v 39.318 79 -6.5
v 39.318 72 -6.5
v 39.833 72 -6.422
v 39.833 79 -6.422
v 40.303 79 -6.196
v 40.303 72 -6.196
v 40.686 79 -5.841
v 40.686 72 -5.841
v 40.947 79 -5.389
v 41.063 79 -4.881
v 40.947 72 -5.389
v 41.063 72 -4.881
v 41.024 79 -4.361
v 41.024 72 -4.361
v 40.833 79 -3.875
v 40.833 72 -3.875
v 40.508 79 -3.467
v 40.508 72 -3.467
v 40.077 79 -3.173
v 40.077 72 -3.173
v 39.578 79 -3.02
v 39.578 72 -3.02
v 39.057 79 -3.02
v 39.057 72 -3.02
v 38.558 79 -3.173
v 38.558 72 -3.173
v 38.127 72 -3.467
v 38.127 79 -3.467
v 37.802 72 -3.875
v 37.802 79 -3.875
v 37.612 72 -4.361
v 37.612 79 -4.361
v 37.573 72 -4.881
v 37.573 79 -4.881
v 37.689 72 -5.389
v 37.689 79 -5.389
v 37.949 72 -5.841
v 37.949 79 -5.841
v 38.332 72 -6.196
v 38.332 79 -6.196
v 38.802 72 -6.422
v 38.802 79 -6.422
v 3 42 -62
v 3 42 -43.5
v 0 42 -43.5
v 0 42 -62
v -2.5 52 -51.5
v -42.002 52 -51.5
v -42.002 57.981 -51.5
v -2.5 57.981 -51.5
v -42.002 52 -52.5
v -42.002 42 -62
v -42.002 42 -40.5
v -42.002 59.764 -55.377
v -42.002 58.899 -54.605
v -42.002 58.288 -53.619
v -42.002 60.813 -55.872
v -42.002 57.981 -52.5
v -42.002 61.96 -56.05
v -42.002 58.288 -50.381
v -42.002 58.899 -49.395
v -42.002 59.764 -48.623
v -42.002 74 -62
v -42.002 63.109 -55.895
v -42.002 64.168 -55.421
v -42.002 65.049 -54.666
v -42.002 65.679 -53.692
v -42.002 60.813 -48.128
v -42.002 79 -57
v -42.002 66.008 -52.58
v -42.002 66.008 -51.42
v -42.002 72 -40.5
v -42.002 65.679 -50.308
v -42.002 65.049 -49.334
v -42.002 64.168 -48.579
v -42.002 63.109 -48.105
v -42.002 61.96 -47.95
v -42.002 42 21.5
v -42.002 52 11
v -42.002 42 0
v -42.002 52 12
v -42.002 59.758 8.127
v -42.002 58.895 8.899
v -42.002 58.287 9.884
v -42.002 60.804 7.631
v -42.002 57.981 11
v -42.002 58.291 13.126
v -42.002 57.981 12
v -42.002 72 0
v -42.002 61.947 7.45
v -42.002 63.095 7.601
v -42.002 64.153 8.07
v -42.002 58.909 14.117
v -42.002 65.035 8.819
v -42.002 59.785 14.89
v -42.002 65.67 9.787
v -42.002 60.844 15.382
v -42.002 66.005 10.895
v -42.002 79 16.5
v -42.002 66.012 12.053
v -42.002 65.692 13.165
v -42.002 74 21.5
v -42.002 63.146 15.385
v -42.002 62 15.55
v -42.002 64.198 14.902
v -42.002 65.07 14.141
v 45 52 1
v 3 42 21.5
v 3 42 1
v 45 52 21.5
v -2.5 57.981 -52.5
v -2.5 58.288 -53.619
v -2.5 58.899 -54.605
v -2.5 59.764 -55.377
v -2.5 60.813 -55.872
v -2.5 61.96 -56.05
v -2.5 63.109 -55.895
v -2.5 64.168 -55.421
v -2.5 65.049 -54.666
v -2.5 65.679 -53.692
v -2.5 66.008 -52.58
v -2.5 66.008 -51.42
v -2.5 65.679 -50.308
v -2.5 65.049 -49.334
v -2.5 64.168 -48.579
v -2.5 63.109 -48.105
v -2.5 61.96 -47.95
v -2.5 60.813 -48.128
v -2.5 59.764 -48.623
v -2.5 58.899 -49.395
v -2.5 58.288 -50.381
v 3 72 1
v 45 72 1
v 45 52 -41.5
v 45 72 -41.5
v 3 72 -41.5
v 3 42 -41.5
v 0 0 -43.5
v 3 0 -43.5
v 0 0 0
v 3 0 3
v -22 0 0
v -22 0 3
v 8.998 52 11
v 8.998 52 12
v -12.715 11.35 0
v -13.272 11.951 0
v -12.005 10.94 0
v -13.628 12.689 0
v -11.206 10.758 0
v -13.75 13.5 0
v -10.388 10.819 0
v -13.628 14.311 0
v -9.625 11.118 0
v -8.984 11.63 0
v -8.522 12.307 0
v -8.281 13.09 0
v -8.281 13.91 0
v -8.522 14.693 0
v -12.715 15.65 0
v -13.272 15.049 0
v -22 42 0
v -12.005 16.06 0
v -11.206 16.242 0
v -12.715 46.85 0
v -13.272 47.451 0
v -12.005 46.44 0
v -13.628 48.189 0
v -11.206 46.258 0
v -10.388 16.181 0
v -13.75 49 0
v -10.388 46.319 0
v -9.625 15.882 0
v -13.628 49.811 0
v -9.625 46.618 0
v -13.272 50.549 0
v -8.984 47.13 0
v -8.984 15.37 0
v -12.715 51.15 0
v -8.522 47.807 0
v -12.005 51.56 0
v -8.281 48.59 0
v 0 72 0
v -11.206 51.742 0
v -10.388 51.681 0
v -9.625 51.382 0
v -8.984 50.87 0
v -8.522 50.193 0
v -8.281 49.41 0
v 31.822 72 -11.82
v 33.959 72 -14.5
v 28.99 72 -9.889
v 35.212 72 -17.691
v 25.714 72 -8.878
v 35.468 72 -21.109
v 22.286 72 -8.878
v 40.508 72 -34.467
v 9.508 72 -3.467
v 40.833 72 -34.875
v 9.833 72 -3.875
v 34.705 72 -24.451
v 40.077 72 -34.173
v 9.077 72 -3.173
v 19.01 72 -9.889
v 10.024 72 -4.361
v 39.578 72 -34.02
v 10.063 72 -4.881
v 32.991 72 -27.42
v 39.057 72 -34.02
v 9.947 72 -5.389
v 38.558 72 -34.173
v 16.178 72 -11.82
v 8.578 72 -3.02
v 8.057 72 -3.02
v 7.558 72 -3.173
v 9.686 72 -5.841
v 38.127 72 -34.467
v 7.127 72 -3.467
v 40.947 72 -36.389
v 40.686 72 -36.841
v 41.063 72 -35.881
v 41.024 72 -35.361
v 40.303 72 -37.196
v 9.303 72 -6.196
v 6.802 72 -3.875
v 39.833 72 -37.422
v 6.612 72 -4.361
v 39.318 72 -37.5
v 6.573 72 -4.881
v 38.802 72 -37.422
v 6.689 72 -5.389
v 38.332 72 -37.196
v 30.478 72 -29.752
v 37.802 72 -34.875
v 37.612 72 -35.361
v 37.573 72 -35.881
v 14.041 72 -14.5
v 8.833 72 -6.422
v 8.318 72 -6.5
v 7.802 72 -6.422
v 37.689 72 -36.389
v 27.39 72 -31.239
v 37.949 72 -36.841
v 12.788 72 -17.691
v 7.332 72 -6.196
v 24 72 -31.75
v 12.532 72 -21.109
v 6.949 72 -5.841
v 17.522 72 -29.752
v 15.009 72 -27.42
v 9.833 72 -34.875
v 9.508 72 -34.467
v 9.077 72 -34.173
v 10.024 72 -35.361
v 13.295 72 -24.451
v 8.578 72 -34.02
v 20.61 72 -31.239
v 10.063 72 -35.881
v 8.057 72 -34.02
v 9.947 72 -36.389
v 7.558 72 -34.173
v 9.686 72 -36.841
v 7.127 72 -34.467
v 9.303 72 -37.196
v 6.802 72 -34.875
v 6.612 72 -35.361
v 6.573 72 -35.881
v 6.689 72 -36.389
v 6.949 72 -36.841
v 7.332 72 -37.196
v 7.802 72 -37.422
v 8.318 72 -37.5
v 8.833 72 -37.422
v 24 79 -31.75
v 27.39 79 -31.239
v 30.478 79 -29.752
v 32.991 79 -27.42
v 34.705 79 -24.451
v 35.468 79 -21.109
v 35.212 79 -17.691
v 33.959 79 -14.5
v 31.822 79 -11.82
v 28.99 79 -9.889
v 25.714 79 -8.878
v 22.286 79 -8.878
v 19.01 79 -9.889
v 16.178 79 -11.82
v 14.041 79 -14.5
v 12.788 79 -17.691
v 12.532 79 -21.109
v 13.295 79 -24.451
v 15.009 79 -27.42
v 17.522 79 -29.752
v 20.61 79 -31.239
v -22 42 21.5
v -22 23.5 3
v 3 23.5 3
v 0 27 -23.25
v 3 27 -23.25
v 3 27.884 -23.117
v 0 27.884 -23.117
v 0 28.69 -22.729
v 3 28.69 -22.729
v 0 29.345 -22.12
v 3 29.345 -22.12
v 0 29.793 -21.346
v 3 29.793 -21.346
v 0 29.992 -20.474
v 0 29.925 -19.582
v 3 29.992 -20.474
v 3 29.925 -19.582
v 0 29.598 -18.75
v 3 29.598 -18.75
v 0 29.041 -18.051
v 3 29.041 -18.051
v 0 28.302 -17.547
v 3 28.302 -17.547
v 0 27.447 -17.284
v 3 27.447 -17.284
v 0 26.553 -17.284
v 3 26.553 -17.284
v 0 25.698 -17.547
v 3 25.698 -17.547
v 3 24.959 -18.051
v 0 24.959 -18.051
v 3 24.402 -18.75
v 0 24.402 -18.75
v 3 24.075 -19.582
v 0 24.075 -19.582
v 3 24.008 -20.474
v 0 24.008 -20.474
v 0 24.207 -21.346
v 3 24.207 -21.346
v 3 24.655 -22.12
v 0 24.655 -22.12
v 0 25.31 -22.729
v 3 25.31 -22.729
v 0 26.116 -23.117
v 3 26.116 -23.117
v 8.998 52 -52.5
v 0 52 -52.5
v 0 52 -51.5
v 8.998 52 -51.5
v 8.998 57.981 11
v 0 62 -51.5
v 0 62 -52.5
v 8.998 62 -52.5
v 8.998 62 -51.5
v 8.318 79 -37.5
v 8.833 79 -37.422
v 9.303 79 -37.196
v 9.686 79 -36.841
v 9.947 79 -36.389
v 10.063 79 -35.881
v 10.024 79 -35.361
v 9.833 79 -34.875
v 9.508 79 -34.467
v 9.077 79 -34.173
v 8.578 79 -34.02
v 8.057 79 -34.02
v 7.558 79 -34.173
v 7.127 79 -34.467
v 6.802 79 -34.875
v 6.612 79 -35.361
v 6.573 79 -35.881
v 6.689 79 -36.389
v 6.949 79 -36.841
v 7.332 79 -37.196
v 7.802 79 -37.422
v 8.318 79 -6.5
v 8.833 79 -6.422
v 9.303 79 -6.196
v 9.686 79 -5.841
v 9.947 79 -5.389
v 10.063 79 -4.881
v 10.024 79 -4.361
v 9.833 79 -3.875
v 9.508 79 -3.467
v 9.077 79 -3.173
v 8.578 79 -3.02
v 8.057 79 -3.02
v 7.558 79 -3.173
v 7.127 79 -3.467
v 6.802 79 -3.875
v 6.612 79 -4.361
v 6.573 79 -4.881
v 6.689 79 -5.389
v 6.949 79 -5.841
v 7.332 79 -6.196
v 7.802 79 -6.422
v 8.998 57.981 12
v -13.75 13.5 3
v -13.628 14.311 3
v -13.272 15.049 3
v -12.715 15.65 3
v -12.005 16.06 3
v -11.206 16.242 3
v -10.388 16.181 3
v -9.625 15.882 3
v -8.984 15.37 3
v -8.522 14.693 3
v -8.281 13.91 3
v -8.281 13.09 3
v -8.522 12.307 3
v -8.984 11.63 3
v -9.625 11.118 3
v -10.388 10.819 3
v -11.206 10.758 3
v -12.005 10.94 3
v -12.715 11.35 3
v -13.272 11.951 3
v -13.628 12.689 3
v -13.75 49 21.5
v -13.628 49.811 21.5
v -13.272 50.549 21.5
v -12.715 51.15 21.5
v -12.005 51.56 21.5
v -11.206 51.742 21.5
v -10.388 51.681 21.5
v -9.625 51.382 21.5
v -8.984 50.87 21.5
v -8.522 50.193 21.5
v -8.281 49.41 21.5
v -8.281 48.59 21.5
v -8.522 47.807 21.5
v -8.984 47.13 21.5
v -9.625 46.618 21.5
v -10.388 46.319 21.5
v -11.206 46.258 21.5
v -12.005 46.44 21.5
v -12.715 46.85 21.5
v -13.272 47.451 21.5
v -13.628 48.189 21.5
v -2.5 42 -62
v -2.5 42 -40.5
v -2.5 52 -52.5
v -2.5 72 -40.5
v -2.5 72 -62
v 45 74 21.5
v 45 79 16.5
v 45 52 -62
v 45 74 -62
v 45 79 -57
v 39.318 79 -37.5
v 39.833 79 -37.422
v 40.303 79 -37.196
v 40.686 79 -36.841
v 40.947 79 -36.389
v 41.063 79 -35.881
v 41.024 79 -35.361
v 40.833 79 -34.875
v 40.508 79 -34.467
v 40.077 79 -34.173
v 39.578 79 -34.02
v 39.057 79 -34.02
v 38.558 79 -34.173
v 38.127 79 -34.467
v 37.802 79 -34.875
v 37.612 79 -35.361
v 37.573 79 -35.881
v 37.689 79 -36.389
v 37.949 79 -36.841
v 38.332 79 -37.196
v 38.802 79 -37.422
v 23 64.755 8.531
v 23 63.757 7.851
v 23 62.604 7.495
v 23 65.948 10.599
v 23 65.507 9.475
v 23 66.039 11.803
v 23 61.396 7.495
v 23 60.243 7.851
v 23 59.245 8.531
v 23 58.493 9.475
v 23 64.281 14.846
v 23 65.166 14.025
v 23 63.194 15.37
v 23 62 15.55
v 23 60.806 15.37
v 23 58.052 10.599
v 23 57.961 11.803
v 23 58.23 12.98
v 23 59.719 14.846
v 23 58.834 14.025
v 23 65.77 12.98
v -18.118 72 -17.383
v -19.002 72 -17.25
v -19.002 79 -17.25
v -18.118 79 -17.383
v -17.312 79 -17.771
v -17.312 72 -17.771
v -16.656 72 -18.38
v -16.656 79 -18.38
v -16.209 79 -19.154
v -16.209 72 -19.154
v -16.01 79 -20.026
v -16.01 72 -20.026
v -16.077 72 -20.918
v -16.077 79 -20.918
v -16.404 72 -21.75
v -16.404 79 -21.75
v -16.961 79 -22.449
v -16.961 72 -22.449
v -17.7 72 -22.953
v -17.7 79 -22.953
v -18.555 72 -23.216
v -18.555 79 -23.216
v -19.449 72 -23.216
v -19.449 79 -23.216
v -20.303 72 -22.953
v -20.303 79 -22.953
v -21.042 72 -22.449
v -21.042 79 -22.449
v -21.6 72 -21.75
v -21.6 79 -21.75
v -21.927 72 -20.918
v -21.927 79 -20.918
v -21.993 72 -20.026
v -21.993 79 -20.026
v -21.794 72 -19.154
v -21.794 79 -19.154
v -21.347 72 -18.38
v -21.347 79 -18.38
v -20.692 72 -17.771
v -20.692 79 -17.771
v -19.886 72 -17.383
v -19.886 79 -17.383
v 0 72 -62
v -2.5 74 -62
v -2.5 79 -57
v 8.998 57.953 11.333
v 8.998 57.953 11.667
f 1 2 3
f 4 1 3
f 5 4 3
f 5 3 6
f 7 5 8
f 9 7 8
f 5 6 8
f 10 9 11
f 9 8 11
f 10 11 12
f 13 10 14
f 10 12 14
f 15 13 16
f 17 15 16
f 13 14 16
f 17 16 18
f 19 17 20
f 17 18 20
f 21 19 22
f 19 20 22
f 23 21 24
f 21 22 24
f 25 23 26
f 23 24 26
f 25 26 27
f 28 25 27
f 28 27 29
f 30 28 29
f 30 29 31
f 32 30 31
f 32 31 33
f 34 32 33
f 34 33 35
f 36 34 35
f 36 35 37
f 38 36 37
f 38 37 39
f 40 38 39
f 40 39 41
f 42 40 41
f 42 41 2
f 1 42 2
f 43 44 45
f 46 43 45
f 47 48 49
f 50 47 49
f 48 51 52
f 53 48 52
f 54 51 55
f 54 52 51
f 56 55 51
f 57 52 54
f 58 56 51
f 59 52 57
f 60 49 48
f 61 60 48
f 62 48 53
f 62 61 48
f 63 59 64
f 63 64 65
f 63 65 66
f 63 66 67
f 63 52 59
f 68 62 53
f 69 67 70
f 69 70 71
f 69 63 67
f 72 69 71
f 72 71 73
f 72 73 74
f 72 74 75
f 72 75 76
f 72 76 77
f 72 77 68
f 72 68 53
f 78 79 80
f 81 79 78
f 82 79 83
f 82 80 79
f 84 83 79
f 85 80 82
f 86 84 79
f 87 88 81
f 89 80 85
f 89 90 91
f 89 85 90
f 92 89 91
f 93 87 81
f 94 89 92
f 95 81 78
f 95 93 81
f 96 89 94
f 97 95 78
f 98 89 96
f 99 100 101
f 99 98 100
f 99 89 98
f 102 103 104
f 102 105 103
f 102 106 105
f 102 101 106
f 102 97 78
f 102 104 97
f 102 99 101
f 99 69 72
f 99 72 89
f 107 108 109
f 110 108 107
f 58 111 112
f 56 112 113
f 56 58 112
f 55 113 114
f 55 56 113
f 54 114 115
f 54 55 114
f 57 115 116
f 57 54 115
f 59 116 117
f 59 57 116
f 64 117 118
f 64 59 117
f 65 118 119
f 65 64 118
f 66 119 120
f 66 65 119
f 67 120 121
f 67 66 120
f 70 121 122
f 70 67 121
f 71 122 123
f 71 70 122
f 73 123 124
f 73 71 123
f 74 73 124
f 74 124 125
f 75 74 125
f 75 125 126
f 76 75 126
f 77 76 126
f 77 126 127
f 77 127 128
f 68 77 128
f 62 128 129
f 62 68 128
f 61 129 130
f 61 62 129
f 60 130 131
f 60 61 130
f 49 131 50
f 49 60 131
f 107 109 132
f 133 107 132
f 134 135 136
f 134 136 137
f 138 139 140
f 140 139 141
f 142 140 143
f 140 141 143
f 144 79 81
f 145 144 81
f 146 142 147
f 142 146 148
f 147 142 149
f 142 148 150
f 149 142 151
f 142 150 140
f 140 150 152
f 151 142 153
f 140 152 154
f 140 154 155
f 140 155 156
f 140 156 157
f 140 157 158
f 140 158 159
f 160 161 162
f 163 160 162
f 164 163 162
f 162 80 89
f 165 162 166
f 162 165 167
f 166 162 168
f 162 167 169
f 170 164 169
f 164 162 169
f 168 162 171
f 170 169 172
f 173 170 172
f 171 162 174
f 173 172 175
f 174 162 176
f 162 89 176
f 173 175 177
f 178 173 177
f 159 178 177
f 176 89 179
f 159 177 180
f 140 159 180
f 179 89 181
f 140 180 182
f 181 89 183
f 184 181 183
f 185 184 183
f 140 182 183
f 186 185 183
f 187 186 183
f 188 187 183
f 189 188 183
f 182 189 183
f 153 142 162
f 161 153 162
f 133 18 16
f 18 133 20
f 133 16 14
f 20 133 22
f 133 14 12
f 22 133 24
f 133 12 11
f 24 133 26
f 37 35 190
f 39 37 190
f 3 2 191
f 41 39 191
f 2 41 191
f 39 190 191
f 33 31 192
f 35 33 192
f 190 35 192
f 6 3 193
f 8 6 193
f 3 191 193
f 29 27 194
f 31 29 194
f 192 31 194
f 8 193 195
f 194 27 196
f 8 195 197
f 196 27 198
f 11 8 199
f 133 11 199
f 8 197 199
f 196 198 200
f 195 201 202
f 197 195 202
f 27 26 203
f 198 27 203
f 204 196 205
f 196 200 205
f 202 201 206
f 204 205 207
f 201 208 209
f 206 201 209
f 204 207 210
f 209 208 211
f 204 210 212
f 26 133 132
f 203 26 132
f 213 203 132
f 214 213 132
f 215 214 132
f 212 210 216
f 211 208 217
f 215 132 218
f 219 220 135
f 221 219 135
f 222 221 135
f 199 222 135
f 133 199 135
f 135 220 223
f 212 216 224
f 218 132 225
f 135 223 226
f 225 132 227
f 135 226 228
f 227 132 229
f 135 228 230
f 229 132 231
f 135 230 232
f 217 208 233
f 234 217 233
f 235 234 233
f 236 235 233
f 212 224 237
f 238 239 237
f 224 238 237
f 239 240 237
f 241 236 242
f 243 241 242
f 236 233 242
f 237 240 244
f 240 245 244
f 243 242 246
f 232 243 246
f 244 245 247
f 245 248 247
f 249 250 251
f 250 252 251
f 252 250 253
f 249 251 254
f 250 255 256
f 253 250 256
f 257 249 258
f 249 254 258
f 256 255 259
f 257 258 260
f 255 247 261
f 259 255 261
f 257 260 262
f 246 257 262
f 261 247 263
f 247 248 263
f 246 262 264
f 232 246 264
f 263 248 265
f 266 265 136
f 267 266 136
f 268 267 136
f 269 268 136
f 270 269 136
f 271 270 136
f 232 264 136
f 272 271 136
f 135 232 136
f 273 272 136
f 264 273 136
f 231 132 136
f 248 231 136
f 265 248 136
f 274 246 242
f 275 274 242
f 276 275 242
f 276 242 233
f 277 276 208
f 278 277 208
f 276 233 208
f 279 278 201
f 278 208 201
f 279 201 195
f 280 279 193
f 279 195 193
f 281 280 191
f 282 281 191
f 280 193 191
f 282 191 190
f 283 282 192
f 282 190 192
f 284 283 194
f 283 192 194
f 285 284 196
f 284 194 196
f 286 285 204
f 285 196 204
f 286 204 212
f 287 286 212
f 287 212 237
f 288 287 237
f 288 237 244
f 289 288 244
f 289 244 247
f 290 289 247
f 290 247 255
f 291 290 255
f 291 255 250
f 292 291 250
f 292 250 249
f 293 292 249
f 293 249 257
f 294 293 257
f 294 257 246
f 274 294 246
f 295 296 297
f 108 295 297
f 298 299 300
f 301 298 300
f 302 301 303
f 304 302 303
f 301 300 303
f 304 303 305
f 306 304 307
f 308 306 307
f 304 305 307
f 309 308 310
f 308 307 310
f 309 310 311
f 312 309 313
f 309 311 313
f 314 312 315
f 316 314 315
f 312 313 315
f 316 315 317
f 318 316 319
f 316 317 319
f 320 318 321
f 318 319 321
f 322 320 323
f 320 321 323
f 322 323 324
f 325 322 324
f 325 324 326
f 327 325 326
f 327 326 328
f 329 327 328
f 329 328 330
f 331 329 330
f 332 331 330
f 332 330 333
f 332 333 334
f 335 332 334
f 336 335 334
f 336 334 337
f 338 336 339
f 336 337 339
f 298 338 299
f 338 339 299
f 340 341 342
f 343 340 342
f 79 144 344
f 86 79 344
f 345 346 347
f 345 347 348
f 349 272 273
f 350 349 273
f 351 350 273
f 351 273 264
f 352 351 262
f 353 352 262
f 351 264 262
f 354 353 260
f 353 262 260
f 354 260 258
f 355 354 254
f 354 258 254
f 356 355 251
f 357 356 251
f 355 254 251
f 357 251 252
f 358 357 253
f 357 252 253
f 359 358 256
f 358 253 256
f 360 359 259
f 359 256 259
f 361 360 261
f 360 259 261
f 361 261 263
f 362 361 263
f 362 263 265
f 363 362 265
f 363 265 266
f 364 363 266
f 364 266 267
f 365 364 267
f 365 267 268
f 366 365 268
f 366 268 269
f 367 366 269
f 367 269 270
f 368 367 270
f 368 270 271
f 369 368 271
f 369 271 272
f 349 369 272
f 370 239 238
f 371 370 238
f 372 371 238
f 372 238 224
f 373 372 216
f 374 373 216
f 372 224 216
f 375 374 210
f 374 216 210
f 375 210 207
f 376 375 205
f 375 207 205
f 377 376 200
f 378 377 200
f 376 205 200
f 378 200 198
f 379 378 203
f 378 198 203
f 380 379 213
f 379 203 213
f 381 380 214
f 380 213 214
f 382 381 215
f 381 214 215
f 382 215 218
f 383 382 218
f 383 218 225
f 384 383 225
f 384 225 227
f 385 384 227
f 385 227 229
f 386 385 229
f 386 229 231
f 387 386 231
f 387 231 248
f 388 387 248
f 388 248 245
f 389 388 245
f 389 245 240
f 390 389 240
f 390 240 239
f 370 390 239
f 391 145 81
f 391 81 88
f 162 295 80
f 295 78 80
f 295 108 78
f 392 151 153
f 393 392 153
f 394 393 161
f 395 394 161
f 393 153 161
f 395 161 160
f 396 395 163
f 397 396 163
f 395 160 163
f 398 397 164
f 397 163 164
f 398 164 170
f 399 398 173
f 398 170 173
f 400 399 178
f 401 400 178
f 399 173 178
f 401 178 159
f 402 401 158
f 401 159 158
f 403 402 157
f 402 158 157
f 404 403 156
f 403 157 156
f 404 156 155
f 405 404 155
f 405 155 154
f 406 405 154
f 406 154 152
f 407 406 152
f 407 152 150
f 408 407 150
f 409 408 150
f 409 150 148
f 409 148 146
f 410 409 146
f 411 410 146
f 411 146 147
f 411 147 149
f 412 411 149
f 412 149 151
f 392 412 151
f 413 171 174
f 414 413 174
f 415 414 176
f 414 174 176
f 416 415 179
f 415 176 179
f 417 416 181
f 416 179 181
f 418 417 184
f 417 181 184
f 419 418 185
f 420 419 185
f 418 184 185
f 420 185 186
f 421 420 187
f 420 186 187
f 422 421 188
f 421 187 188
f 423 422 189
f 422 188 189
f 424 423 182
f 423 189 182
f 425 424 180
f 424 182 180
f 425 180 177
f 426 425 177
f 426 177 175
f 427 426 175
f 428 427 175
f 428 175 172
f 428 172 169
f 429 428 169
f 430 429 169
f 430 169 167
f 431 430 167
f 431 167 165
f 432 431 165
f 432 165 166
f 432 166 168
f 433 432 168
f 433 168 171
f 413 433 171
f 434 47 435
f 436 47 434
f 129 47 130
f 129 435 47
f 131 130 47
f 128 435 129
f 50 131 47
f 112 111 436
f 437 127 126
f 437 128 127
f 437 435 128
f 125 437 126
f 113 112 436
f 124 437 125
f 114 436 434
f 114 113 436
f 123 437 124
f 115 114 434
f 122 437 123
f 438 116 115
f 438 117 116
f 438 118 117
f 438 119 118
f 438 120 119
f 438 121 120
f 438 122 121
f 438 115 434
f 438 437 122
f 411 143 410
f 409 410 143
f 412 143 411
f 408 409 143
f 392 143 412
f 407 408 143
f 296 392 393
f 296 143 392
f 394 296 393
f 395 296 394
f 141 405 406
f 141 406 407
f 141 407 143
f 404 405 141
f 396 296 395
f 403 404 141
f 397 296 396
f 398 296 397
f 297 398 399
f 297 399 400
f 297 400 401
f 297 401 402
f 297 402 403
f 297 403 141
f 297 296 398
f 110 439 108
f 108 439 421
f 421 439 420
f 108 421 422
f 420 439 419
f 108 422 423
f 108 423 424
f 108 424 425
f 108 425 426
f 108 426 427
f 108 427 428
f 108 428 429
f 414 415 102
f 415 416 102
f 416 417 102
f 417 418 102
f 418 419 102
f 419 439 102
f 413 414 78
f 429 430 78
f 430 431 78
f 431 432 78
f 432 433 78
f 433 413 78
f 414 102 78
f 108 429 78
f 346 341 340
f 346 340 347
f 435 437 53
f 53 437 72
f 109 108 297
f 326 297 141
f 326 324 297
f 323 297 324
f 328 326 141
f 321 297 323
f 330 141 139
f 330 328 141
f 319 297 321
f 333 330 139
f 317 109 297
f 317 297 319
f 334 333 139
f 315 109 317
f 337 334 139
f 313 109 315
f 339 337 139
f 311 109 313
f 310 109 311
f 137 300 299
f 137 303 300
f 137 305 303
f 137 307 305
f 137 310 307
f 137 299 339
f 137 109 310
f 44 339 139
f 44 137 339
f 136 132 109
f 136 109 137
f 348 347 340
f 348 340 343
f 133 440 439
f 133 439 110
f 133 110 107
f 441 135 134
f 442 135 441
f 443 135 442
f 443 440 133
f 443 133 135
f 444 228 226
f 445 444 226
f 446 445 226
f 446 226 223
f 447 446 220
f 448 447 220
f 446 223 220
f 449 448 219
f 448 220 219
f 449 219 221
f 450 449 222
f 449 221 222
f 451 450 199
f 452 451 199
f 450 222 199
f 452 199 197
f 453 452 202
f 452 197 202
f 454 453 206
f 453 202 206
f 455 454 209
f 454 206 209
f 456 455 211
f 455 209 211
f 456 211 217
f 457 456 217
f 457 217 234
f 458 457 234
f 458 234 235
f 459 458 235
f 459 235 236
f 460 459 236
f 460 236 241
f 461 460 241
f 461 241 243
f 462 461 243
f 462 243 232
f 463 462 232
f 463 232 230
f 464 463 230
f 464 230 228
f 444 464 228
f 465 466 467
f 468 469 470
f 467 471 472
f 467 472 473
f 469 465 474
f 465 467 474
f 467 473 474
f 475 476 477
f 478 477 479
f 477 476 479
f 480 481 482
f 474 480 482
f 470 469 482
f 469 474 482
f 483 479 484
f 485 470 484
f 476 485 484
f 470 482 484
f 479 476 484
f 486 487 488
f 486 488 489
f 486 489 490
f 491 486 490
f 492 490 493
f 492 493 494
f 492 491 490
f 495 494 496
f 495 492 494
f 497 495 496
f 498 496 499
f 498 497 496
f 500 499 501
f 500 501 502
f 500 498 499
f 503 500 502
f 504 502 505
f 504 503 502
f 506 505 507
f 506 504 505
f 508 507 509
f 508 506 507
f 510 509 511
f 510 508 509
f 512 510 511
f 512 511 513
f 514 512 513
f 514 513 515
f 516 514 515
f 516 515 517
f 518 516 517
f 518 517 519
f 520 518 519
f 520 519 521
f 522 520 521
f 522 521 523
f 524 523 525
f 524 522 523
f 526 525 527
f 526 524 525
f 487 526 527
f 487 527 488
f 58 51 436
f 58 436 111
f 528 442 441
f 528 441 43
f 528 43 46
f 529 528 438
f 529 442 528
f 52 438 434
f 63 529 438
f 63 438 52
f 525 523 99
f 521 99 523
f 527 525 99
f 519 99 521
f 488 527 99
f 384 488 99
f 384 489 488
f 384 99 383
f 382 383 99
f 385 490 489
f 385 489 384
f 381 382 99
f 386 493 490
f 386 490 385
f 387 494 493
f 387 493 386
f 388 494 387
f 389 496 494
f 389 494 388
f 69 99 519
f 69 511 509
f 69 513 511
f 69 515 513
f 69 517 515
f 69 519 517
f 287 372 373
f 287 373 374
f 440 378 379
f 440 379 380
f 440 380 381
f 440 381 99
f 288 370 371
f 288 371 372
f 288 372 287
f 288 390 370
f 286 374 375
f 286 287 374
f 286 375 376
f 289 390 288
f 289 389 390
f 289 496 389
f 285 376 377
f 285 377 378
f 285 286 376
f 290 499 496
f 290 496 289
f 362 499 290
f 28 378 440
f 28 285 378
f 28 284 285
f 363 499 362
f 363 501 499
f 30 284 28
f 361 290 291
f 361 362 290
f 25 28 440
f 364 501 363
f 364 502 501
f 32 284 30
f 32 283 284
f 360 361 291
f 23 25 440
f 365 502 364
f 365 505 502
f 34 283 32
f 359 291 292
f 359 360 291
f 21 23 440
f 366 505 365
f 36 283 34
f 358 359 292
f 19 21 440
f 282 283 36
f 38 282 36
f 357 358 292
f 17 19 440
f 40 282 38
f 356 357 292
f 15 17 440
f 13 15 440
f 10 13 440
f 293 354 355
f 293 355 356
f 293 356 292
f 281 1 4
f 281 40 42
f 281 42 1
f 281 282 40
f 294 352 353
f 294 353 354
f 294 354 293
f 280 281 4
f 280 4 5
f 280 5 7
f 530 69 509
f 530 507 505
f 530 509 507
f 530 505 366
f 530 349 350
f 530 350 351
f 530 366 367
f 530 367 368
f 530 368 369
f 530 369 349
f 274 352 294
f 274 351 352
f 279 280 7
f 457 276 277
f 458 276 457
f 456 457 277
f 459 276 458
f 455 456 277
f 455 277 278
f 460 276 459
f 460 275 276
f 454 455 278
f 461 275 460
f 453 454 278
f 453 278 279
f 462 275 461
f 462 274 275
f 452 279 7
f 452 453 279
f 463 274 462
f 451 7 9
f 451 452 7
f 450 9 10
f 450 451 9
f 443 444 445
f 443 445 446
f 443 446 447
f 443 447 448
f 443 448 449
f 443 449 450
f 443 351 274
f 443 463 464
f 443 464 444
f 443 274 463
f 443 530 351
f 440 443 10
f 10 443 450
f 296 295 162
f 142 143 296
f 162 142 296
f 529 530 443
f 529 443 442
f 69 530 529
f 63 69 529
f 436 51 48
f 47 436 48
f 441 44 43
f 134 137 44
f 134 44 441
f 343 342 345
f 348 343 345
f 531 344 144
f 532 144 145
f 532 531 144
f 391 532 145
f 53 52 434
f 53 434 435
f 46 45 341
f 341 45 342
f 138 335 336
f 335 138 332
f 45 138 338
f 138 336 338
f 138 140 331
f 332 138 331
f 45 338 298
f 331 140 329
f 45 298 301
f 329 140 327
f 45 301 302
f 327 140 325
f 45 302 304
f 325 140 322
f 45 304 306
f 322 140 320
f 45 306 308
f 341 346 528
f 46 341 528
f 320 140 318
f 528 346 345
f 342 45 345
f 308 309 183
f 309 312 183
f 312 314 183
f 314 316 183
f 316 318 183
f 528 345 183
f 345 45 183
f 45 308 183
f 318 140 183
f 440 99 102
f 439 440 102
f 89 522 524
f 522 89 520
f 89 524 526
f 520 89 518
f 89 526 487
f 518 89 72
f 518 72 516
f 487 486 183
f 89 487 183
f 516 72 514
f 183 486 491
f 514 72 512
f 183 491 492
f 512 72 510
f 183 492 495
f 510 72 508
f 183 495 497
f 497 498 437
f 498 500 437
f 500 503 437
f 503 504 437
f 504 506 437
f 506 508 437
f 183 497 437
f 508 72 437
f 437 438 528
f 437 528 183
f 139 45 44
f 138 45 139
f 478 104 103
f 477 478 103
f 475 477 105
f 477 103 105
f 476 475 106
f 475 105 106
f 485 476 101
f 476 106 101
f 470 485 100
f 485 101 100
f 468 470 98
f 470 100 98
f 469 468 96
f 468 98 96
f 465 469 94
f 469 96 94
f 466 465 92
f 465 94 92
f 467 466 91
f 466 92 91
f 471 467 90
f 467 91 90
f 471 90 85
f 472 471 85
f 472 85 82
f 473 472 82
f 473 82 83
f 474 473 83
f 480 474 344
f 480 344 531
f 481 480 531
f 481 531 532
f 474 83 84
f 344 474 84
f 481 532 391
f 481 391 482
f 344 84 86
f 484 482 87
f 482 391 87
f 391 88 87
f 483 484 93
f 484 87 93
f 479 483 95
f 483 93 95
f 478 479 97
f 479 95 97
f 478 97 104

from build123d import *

# Parameters (mm, degrees)
BOSS_EXTRUDE1_DEPTH      = 75
SKETCH4_R                = 3
CUT_EXTRUDE1_DEPTH       = 3
BOSS_EXTRUDE2_DEPTH      = 4
BOSS_EXTRUDE2_DEPTH_BACK = 3
SKETCH2_R                = 3
SKETCH8_W                = 20.001838136
SKETCH8_H                = 30
BOSS_EXTRUDE6_DEPTH      = 3
SKETCH9_W                = 39.501838136
SKETCH9_H                = 30
BOSS_EXTRUDE7_DEPTH      = 3
SKETCH10_R               = 4.05
BOSS_EXTRUDE8_DEPTH      = 45.001838136
SKETCH11_R               = 4.05
BOSS_EXTRUDE9_DEPTH      = 42
SKETCH12_R               = 11.5
SKETCH12_R_2             = 1.75
CUT_EXTRUDE2_DEPTH       = 42
CUT_EXTRUDE3_START       = -5.5
SKETCH13_R               = 4.05
CUT_EXTRUDE3_DEPTH       = 5.5
SKETCH14_W               = 47.5
SKETCH14_H               = 18.5
BOSS_EXTRUDE11_DEPTH     = 7
CHAMFER1_START           = 96.166522241
CHAMFER1_OUTLINE_W       = 47.5
CHAMFER1_OUTLINE_H       = 10
CHAMFER1_DEPTH           = 4.833477759
SKETCH17_W               = 45
SKETCH17_H               = 18.5
BOSS_EXTRUDE12_DEPTH     = 30
CUT_EXTRUDE5_DEPTH       = 111.611934257
CUT_EXTRUDE5_DEPTH_BACK  = 111.611934257
SKETCH19_R               = 2.75
CUT_EXTRUDE6_DEPTH       = 22
BOSS_EXTRUDE13_START     = -22
SKETCH20_R               = 4.05
BOSS_EXTRUDE13_DEPTH     = 22
SKETCH22_W               = 1
SKETCH22_H               = 10
CUT_EXTRUDE_THIN1_DEPTH  = 51
CHAMFER2_SIZE            = 18.5


with BuildPart() as part:
    # Sketch1 → Boss-Extrude1 (new body)
    with BuildSketch(Plane(origin=(0, 0, 0), x_dir=(1, 0, 0), z_dir=(0, 1, 0))):
        Polygon((0, 0), (0, 40.5), (3, 40.5), (3, -3), (-22, -3), (-22, 0), align=None)
    extrude(amount=BOSS_EXTRUDE1_DEPTH)

    # Sketch4 → Cut-Extrude1 (cut)
    with BuildSketch(Plane(origin=(3, 0, 0), x_dir=(0, 0, -1), z_dir=(1, 0, 0))):
        with Locations((20.25, 27)):
            Circle(SKETCH4_R)
    extrude(amount=-CUT_EXTRUDE1_DEPTH, mode=Mode.SUBTRACT)

    # Sketch2 → Boss-Extrude2 (add, two sides: drawn at the far end of the back side and taken through both)
    with BuildSketch(Plane(origin=(0, 75, 0), x_dir=(1, 0, 0), z_dir=(0, 1, 0)).offset(-BOSS_EXTRUDE2_DEPTH_BACK)):
        Polygon((-0.001838136, 40.5), (-42.001838136, 40.5), (-42.001838136, 0), (-42.001838136, -3), (3, -3), (3, 40.5), align=None)
        with Locations(Location((-19.001838136, 20.25, 0), (0, 0, 270))):
            Circle(SKETCH2_R, mode=Mode.SUBTRACT)
    extrude(amount=BOSS_EXTRUDE2_DEPTH + BOSS_EXTRUDE2_DEPTH_BACK)

    # Sketch8 → Boss-Extrude6 (add)
    with BuildSketch(Plane.XY.offset(3)):
        with Locations((-32.000919068, 57)):
            Rectangle(SKETCH8_W, SKETCH8_H)
    extrude(amount=-BOSS_EXTRUDE6_DEPTH)

    # Sketch9 → Boss-Extrude7 (add)
    with BuildSketch(Plane(origin=(0, 0, -40.5), x_dir=(-1, 0, 0), z_dir=(0, 0, -1))):
        Polygon((42.001838136, 79), (-3, 79), (-3, 0), (0, 0), (0, 72), (42.001838136, 72), align=None)
        with Locations((22.250919068, 57)):
            Rectangle(SKETCH9_W, SKETCH9_H)
    extrude(amount=BOSS_EXTRUDE7_DEPTH)

    # Sketch10 → Boss-Extrude8 (add)
    with BuildSketch(Plane.ZY.offset(42.001838136)):
        Polygon((3, 79), (16.5, 79), (21.5, 74), (21.5, 42), (3, 42), align=None)
        with Locations((11.5, 62)):
            Circle(SKETCH10_R, mode=Mode.SUBTRACT)
    boss_extrude8 = extrude(amount=-BOSS_EXTRUDE8_DEPTH)

    # Sketch11 → Boss-Extrude9 (add)
    with BuildSketch(Plane(origin=(3, 0, 0), x_dir=(0, 0, -1), z_dir=(1, 0, 0))):
        Polygon((-1, 42), (-1, 72), (41.5, 72), (41.5, 42), (43.5, 42), (43.5, 79), (-16.5, 79), (-21.5, 74), (-21.5, 42), (-3, 42), align=None)
        with Locations(Location((-11.5, 62, 0), (0, 0, 180))):
            Circle(SKETCH11_R, mode=Mode.SUBTRACT)
    extrude(amount=BOSS_EXTRUDE9_DEPTH)

    # Mirror3: Boss-Extrude8 across plane
    add(boss_extrude8.mirror(Plane.XY.offset(-20.25)))

    # Sketch12 → Cut-Extrude2 (cut)
    with BuildSketch(Plane.XZ.offset(-72)):
        with Locations(Location((24, -20.25, 0), (0, 0, 270))):
            Circle(SKETCH12_R)
        with Locations(Location((39.317647059, -4.75, 0), (0, 0, 270))):
            Circle(SKETCH12_R_2)
        with Locations(Location((8.317647059, -4.75, 0), (0, 0, 270))):
            Circle(SKETCH12_R_2)
        with Locations(Location((8.317647059, -35.75, 0), (0, 0, 270))):
            Circle(SKETCH12_R_2)
        with Locations(Location((39.317647059, -35.75, 0), (0, 0, 270))):
            Circle(SKETCH12_R_2)
    extrude(amount=-CUT_EXTRUDE2_DEPTH, mode=Mode.SUBTRACT)

    # Sketch13 → Cut-Extrude3 (cut)
    with BuildSketch(Plane(origin=(3, 0, 0), x_dir=(0, 0, -1), z_dir=(1, 0, 0)).offset(CUT_EXTRUDE3_START)):
        Polygon((43.5, 42), (62, 42), (62, 74), (57, 79), (43.5, 79), align=None)
        with Locations(Location((52, 62, 0), (0, 0, 270))):
            Circle(SKETCH13_R, mode=Mode.SUBTRACT)
    extrude(amount=CUT_EXTRUDE3_DEPTH, mode=Mode.SUBTRACT)

    # Sketch14 → Boss-Extrude11 (add)
    with BuildSketch(Plane(origin=(0, 79, 0), x_dir=(1, 0, 0), z_dir=(0, 1, 0))):
        with Locations((21.25, 52.75)):
            Rectangle(SKETCH14_W, SKETCH14_H)
    extrude(amount=-BOSS_EXTRUDE11_DEPTH)

    # Chamfer1: read off the stored shape, not the designer's step
    # Chamfer1 outline → Chamfer1 (cut)
    with BuildSketch(Plane(origin=(0, 0, 0), x_dir=(1, 0, 0), z_dir=(0, 0.7071067811865466, -0.7071067811865486)).offset(CHAMFER1_START)):
        with Locations((21.25, -12)):
            Rectangle(CHAMFER1_OUTLINE_W, CHAMFER1_OUTLINE_H)
    extrude(amount=CHAMFER1_DEPTH, mode=Mode.SUBTRACT)

    # Sketch17 → Boss-Extrude12 (add)
    with BuildSketch(Plane(origin=(0, 72, 0), x_dir=(-1, 0, 0), z_dir=(0, -1, 0))):
        with Locations((-22.5, 52.75)):
            Rectangle(SKETCH17_W, SKETCH17_H)
    extrude(amount=BOSS_EXTRUDE12_DEPTH)

    # Sketch18 → Cut-Extrude5 (cut, two sides: drawn at the far end of the back side and taken through both)
    with BuildSketch(Plane(origin=(0, 0, 1), x_dir=(-1, 0, 0), z_dir=(0, 0, -1)).offset(-CUT_EXTRUDE5_DEPTH_BACK)):
        Polygon((-45, 52), (-45, 42), (-3, 42), align=None)
    extrude(amount=CUT_EXTRUDE5_DEPTH + CUT_EXTRUDE5_DEPTH_BACK, mode=Mode.SUBTRACT)

    # Sketch19 → Cut-Extrude6 (cut)
    with BuildSketch(Plane(origin=(0, 0, 0), x_dir=(-1, 0, 0), z_dir=(0, 0, -1))):
        with Locations((11, 49)):
            Circle(SKETCH19_R)
        with Locations((11, 13.5)):
            Circle(SKETCH19_R)
    extrude(amount=-CUT_EXTRUDE6_DEPTH, mode=Mode.SUBTRACT)

    # Sketch20 → Boss-Extrude13 (add)
    with BuildSketch(Plane(origin=(45, 0, 0), x_dir=(0, 0, -1), z_dir=(1, 0, 0)).offset(BOSS_EXTRUDE13_START)):
        with Locations(Location((-11.5, 62, 0), (0, 0, 180))):
            Circle(SKETCH20_R)
    extrude(amount=BOSS_EXTRUDE13_DEPTH)

    # Sketch22 → Cut-Extrude-Thin1 (cut)
    with BuildSketch(Plane.ZY.offset(42.001838136)):
        with Locations((-52, 57)):
            Rectangle(SKETCH22_W, SKETCH22_H)
        with Locations((11.5, 57)):
            Rectangle(SKETCH22_W, SKETCH22_H)
    extrude(amount=-CUT_EXTRUDE_THIN1_DEPTH, mode=Mode.SUBTRACT)

    # Chamfer2
    chamfer2_edges = [part.edges().sort_by_distance(p)[0] for p in [
        (-9.5, 42, 3),
    ]]
    chamfer(chamfer2_edges, length=CHAMFER2_SIZE - 0.0001)  # a hair under: the kernel refuses the full size


solid = part.part
